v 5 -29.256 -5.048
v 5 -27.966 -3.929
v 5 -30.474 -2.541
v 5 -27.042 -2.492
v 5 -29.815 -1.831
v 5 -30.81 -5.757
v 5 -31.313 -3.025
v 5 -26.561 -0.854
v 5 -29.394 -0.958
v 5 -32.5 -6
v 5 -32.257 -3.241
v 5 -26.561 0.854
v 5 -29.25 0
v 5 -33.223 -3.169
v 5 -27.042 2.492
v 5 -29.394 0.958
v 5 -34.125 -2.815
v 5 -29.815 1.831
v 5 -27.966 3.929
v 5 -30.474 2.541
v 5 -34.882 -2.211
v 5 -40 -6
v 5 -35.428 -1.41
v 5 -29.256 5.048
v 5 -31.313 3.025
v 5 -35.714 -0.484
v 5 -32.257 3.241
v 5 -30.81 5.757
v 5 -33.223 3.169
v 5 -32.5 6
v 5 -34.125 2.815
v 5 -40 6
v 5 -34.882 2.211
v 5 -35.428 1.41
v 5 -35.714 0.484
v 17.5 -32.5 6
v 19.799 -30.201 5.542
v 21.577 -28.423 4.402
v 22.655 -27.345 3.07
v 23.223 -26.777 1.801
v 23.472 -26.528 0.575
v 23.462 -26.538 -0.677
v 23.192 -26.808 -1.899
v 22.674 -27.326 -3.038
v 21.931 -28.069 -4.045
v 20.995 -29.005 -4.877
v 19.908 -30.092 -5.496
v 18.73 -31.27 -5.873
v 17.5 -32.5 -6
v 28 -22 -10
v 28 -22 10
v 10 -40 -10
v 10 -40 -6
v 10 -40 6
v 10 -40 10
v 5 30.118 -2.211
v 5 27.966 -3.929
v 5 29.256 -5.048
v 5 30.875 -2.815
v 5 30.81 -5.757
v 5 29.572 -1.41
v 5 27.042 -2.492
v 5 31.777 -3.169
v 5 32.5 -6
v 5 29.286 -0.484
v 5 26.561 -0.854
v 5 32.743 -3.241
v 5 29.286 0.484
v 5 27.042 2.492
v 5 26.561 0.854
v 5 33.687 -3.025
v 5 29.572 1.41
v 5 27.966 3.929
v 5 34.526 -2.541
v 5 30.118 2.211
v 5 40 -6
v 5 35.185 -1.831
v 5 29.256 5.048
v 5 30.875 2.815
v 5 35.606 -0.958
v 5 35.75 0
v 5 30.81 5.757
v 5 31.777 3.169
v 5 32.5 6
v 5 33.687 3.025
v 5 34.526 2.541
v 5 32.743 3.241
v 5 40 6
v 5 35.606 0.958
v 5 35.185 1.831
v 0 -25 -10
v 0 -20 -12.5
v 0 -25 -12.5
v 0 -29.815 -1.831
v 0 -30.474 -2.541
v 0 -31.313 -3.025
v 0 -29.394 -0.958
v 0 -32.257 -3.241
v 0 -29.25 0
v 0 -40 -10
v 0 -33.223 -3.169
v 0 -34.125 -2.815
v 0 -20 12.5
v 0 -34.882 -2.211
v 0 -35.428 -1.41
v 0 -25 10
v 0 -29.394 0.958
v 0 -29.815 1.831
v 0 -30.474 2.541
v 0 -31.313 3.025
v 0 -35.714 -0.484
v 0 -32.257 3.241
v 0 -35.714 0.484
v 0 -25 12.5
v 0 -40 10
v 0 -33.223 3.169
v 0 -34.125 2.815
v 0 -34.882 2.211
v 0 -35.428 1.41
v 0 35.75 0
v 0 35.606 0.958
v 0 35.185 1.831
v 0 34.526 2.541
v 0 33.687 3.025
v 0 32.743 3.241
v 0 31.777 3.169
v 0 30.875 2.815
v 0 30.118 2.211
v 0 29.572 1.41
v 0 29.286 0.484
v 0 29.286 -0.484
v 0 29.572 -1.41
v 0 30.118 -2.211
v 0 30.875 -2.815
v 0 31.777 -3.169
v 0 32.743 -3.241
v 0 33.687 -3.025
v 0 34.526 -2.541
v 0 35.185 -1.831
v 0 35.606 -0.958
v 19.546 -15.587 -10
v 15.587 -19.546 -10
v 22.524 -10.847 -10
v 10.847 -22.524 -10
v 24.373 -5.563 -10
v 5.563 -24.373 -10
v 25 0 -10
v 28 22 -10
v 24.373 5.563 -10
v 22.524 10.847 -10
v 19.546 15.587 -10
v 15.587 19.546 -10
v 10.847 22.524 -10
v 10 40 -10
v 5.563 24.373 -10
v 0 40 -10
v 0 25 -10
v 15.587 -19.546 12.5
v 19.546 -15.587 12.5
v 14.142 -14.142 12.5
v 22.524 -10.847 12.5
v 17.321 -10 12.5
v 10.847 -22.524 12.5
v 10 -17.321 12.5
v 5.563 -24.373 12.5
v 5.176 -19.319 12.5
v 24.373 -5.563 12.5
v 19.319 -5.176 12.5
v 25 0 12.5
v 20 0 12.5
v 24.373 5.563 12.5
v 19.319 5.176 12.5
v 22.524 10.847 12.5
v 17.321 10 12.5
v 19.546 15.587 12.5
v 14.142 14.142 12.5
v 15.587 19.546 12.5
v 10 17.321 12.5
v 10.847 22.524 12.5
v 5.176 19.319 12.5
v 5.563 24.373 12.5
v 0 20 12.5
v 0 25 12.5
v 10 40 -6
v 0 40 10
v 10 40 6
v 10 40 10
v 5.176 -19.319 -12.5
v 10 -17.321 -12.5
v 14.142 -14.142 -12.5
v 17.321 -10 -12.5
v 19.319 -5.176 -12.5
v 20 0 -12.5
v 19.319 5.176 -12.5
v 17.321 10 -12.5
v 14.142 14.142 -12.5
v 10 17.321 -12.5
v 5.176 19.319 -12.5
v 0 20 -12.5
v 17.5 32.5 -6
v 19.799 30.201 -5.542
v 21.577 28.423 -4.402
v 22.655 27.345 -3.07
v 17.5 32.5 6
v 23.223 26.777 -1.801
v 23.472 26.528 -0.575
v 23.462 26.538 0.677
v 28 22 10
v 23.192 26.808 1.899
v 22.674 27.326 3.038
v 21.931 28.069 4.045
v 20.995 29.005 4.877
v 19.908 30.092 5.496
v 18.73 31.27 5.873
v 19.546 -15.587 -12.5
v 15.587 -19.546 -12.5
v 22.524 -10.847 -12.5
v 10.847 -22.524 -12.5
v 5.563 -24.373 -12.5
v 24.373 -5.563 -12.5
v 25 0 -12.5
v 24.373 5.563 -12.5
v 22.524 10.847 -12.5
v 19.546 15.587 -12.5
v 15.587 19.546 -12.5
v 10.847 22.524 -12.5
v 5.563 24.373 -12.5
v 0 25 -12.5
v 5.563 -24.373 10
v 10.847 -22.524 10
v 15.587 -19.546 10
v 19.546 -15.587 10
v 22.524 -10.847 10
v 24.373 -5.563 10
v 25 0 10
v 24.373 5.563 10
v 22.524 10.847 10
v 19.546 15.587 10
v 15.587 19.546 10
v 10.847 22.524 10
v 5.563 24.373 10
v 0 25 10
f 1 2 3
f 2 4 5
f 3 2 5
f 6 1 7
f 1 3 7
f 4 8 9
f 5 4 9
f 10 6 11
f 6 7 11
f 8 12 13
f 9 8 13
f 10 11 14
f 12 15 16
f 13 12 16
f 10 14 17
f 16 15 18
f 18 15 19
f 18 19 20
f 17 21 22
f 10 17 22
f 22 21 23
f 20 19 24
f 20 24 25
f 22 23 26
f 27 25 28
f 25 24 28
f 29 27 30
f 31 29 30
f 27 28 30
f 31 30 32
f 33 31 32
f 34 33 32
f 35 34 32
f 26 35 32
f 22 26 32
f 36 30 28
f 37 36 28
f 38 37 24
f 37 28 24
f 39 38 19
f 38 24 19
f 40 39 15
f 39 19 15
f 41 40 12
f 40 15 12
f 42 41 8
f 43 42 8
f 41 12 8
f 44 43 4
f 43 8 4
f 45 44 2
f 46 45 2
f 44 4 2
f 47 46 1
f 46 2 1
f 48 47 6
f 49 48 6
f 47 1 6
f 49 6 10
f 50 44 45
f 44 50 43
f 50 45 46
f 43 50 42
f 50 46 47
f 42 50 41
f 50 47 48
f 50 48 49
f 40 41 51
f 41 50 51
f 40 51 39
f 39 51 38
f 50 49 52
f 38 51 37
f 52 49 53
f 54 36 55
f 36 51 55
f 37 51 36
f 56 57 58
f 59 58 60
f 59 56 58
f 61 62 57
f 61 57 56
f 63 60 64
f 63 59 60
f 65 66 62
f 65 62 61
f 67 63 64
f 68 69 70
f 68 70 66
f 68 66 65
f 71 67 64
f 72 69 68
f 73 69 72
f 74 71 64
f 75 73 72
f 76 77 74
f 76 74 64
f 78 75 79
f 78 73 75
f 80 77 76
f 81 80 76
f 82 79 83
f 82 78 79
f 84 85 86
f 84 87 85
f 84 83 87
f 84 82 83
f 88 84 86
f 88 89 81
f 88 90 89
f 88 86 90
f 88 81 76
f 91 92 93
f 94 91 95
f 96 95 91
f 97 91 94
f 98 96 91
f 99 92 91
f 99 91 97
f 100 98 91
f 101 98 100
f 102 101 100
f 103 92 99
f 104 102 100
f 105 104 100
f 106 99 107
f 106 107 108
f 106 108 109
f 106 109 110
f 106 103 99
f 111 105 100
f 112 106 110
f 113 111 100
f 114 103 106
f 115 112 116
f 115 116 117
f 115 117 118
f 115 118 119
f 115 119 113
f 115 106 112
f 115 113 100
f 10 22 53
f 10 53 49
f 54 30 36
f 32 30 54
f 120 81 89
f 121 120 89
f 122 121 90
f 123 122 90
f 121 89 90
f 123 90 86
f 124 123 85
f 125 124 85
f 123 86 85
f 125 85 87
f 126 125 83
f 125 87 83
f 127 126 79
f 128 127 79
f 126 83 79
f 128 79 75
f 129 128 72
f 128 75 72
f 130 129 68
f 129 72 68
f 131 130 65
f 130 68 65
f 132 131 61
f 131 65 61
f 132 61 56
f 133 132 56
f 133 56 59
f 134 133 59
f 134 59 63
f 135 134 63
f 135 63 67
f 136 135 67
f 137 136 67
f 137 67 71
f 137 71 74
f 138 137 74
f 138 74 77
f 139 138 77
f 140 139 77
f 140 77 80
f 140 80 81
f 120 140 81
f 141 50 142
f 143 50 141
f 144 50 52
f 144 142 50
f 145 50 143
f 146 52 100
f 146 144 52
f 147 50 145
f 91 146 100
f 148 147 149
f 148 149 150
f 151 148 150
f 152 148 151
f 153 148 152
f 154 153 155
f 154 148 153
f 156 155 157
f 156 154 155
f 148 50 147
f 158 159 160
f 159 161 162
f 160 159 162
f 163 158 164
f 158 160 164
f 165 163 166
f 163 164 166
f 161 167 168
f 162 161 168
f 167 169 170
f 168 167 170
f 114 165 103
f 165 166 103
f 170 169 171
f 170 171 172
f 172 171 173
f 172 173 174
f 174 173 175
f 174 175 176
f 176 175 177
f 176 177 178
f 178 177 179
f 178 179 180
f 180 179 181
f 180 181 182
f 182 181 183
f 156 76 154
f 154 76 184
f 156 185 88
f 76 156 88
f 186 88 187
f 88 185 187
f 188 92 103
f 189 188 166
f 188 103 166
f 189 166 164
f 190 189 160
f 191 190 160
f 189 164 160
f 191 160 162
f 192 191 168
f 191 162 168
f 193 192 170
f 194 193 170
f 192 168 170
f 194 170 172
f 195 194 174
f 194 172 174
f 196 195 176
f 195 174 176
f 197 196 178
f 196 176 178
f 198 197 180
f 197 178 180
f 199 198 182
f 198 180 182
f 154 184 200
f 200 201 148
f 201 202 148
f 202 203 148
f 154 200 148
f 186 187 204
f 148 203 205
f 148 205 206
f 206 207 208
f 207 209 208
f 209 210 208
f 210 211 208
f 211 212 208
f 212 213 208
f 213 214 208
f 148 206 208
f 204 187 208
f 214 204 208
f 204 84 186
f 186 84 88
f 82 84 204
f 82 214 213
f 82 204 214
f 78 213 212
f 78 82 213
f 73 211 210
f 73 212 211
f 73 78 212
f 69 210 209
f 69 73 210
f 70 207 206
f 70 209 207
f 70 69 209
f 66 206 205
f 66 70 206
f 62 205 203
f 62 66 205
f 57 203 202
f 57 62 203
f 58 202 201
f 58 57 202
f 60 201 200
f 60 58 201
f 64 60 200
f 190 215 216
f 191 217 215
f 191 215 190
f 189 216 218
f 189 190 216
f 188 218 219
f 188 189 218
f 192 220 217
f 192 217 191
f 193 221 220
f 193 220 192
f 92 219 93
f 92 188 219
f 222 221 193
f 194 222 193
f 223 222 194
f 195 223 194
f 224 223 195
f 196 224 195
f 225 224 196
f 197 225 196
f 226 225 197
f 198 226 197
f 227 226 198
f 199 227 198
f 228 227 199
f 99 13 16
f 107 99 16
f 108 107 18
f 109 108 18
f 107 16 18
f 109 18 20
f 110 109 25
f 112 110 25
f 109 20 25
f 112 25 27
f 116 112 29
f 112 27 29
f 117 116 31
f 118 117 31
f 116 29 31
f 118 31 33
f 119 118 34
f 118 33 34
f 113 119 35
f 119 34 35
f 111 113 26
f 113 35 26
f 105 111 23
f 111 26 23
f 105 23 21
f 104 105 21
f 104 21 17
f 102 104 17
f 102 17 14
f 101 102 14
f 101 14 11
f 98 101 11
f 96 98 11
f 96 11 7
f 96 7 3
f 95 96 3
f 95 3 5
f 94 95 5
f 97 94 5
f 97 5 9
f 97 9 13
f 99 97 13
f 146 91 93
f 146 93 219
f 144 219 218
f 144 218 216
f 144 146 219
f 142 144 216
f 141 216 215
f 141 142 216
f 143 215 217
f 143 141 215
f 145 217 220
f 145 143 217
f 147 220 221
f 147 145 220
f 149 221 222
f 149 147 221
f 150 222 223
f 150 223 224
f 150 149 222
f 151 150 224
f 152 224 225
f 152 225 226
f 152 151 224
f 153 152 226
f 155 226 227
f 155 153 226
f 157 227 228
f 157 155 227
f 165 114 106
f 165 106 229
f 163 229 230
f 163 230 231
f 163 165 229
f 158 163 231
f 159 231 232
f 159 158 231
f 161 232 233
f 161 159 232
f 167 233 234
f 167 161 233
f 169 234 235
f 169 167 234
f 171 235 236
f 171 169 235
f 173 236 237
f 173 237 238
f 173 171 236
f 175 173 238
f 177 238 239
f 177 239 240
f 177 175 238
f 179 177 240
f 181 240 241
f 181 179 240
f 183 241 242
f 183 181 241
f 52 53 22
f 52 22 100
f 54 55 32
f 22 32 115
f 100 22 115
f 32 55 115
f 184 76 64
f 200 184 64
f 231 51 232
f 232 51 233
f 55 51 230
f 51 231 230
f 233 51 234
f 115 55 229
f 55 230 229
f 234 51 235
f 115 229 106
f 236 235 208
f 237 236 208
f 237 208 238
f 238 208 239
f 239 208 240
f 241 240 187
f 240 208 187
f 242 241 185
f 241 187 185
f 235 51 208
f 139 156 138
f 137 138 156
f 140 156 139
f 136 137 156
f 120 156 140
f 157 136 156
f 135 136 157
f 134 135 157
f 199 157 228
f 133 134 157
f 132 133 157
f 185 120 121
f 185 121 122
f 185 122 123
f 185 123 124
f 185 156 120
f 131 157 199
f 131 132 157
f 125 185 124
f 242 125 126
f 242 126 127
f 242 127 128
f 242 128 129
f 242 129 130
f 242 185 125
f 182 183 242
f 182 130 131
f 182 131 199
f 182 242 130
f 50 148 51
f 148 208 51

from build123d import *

# Parameters (mm, degrees)
PAD_DEPTH       = 12.5
PAD001_DEPTH    = 10
POCKET_DEPTH    = 199.738093
SKETCH003_R     = 3.25
POCKET001_DEPTH = 10


with BuildPart() as part:
    # Sketch → Pad (new body, symmetric)
    with BuildSketch(Plane.XY):
        with BuildLine():
            ThreePointArc((0, -20), (20, 0), (0, 20))
            Line((0, 25), (0, 20))
            ThreePointArc((0, -25), (25, 0), (0, 25))
            Line((0, -20), (0, -25))
        make_face()
    extrude(amount=PAD_DEPTH, both=True)

    # Sketch001 → Pad001 (join, symmetric)
    with BuildSketch(Plane.XY):
        with BuildLine():
            Line((0, 25), (0, 40))
            Line((0, 40), (10, 40))
            Line((10, 40), (28, 22))
            Line((28, 22), (28, -22))
            Line((28, -22), (10, -40))
            Line((10, -40), (0, -40))
            Line((0, -40), (0, -25))
            ThreePointArc((0, -25), (25, 0), (0, 25))
        make_face()
    extrude(amount=PAD001_DEPTH, both=True)

    # Sketch002 (on DatumPlane) → Pocket (cut, through all)
    with BuildSketch(Plane.YZ.offset(5)):
        with BuildLine():
            ThreePointArc((32.5, 6), (26.5, 0), (32.5, -6))
            Line((113.900581, -6), (32.5, -6))
            Line((113.900581, 6), (113.900581, -6))
            Line((32.5, 6), (113.900581, 6))
        make_face()
    pocket = extrude(amount=POCKET_DEPTH, mode=Mode.SUBTRACT)

    # Mirrored: Pocket across XZ
    add(pocket.mirror(Plane.XZ), mode=Mode.SUBTRACT)

    # Sketch003 (on DatumPlane) → Pocket001 (cut)
    with BuildSketch(Plane.YZ.offset(5)):
        with Locations((32.5, 0)):
            Circle(SKETCH003_R)
        with Locations((-32.5, 0)):
            Circle(SKETCH003_R)
    extrude(amount=-POCKET001_DEPTH, mode=Mode.SUBTRACT)


solid = part.part
